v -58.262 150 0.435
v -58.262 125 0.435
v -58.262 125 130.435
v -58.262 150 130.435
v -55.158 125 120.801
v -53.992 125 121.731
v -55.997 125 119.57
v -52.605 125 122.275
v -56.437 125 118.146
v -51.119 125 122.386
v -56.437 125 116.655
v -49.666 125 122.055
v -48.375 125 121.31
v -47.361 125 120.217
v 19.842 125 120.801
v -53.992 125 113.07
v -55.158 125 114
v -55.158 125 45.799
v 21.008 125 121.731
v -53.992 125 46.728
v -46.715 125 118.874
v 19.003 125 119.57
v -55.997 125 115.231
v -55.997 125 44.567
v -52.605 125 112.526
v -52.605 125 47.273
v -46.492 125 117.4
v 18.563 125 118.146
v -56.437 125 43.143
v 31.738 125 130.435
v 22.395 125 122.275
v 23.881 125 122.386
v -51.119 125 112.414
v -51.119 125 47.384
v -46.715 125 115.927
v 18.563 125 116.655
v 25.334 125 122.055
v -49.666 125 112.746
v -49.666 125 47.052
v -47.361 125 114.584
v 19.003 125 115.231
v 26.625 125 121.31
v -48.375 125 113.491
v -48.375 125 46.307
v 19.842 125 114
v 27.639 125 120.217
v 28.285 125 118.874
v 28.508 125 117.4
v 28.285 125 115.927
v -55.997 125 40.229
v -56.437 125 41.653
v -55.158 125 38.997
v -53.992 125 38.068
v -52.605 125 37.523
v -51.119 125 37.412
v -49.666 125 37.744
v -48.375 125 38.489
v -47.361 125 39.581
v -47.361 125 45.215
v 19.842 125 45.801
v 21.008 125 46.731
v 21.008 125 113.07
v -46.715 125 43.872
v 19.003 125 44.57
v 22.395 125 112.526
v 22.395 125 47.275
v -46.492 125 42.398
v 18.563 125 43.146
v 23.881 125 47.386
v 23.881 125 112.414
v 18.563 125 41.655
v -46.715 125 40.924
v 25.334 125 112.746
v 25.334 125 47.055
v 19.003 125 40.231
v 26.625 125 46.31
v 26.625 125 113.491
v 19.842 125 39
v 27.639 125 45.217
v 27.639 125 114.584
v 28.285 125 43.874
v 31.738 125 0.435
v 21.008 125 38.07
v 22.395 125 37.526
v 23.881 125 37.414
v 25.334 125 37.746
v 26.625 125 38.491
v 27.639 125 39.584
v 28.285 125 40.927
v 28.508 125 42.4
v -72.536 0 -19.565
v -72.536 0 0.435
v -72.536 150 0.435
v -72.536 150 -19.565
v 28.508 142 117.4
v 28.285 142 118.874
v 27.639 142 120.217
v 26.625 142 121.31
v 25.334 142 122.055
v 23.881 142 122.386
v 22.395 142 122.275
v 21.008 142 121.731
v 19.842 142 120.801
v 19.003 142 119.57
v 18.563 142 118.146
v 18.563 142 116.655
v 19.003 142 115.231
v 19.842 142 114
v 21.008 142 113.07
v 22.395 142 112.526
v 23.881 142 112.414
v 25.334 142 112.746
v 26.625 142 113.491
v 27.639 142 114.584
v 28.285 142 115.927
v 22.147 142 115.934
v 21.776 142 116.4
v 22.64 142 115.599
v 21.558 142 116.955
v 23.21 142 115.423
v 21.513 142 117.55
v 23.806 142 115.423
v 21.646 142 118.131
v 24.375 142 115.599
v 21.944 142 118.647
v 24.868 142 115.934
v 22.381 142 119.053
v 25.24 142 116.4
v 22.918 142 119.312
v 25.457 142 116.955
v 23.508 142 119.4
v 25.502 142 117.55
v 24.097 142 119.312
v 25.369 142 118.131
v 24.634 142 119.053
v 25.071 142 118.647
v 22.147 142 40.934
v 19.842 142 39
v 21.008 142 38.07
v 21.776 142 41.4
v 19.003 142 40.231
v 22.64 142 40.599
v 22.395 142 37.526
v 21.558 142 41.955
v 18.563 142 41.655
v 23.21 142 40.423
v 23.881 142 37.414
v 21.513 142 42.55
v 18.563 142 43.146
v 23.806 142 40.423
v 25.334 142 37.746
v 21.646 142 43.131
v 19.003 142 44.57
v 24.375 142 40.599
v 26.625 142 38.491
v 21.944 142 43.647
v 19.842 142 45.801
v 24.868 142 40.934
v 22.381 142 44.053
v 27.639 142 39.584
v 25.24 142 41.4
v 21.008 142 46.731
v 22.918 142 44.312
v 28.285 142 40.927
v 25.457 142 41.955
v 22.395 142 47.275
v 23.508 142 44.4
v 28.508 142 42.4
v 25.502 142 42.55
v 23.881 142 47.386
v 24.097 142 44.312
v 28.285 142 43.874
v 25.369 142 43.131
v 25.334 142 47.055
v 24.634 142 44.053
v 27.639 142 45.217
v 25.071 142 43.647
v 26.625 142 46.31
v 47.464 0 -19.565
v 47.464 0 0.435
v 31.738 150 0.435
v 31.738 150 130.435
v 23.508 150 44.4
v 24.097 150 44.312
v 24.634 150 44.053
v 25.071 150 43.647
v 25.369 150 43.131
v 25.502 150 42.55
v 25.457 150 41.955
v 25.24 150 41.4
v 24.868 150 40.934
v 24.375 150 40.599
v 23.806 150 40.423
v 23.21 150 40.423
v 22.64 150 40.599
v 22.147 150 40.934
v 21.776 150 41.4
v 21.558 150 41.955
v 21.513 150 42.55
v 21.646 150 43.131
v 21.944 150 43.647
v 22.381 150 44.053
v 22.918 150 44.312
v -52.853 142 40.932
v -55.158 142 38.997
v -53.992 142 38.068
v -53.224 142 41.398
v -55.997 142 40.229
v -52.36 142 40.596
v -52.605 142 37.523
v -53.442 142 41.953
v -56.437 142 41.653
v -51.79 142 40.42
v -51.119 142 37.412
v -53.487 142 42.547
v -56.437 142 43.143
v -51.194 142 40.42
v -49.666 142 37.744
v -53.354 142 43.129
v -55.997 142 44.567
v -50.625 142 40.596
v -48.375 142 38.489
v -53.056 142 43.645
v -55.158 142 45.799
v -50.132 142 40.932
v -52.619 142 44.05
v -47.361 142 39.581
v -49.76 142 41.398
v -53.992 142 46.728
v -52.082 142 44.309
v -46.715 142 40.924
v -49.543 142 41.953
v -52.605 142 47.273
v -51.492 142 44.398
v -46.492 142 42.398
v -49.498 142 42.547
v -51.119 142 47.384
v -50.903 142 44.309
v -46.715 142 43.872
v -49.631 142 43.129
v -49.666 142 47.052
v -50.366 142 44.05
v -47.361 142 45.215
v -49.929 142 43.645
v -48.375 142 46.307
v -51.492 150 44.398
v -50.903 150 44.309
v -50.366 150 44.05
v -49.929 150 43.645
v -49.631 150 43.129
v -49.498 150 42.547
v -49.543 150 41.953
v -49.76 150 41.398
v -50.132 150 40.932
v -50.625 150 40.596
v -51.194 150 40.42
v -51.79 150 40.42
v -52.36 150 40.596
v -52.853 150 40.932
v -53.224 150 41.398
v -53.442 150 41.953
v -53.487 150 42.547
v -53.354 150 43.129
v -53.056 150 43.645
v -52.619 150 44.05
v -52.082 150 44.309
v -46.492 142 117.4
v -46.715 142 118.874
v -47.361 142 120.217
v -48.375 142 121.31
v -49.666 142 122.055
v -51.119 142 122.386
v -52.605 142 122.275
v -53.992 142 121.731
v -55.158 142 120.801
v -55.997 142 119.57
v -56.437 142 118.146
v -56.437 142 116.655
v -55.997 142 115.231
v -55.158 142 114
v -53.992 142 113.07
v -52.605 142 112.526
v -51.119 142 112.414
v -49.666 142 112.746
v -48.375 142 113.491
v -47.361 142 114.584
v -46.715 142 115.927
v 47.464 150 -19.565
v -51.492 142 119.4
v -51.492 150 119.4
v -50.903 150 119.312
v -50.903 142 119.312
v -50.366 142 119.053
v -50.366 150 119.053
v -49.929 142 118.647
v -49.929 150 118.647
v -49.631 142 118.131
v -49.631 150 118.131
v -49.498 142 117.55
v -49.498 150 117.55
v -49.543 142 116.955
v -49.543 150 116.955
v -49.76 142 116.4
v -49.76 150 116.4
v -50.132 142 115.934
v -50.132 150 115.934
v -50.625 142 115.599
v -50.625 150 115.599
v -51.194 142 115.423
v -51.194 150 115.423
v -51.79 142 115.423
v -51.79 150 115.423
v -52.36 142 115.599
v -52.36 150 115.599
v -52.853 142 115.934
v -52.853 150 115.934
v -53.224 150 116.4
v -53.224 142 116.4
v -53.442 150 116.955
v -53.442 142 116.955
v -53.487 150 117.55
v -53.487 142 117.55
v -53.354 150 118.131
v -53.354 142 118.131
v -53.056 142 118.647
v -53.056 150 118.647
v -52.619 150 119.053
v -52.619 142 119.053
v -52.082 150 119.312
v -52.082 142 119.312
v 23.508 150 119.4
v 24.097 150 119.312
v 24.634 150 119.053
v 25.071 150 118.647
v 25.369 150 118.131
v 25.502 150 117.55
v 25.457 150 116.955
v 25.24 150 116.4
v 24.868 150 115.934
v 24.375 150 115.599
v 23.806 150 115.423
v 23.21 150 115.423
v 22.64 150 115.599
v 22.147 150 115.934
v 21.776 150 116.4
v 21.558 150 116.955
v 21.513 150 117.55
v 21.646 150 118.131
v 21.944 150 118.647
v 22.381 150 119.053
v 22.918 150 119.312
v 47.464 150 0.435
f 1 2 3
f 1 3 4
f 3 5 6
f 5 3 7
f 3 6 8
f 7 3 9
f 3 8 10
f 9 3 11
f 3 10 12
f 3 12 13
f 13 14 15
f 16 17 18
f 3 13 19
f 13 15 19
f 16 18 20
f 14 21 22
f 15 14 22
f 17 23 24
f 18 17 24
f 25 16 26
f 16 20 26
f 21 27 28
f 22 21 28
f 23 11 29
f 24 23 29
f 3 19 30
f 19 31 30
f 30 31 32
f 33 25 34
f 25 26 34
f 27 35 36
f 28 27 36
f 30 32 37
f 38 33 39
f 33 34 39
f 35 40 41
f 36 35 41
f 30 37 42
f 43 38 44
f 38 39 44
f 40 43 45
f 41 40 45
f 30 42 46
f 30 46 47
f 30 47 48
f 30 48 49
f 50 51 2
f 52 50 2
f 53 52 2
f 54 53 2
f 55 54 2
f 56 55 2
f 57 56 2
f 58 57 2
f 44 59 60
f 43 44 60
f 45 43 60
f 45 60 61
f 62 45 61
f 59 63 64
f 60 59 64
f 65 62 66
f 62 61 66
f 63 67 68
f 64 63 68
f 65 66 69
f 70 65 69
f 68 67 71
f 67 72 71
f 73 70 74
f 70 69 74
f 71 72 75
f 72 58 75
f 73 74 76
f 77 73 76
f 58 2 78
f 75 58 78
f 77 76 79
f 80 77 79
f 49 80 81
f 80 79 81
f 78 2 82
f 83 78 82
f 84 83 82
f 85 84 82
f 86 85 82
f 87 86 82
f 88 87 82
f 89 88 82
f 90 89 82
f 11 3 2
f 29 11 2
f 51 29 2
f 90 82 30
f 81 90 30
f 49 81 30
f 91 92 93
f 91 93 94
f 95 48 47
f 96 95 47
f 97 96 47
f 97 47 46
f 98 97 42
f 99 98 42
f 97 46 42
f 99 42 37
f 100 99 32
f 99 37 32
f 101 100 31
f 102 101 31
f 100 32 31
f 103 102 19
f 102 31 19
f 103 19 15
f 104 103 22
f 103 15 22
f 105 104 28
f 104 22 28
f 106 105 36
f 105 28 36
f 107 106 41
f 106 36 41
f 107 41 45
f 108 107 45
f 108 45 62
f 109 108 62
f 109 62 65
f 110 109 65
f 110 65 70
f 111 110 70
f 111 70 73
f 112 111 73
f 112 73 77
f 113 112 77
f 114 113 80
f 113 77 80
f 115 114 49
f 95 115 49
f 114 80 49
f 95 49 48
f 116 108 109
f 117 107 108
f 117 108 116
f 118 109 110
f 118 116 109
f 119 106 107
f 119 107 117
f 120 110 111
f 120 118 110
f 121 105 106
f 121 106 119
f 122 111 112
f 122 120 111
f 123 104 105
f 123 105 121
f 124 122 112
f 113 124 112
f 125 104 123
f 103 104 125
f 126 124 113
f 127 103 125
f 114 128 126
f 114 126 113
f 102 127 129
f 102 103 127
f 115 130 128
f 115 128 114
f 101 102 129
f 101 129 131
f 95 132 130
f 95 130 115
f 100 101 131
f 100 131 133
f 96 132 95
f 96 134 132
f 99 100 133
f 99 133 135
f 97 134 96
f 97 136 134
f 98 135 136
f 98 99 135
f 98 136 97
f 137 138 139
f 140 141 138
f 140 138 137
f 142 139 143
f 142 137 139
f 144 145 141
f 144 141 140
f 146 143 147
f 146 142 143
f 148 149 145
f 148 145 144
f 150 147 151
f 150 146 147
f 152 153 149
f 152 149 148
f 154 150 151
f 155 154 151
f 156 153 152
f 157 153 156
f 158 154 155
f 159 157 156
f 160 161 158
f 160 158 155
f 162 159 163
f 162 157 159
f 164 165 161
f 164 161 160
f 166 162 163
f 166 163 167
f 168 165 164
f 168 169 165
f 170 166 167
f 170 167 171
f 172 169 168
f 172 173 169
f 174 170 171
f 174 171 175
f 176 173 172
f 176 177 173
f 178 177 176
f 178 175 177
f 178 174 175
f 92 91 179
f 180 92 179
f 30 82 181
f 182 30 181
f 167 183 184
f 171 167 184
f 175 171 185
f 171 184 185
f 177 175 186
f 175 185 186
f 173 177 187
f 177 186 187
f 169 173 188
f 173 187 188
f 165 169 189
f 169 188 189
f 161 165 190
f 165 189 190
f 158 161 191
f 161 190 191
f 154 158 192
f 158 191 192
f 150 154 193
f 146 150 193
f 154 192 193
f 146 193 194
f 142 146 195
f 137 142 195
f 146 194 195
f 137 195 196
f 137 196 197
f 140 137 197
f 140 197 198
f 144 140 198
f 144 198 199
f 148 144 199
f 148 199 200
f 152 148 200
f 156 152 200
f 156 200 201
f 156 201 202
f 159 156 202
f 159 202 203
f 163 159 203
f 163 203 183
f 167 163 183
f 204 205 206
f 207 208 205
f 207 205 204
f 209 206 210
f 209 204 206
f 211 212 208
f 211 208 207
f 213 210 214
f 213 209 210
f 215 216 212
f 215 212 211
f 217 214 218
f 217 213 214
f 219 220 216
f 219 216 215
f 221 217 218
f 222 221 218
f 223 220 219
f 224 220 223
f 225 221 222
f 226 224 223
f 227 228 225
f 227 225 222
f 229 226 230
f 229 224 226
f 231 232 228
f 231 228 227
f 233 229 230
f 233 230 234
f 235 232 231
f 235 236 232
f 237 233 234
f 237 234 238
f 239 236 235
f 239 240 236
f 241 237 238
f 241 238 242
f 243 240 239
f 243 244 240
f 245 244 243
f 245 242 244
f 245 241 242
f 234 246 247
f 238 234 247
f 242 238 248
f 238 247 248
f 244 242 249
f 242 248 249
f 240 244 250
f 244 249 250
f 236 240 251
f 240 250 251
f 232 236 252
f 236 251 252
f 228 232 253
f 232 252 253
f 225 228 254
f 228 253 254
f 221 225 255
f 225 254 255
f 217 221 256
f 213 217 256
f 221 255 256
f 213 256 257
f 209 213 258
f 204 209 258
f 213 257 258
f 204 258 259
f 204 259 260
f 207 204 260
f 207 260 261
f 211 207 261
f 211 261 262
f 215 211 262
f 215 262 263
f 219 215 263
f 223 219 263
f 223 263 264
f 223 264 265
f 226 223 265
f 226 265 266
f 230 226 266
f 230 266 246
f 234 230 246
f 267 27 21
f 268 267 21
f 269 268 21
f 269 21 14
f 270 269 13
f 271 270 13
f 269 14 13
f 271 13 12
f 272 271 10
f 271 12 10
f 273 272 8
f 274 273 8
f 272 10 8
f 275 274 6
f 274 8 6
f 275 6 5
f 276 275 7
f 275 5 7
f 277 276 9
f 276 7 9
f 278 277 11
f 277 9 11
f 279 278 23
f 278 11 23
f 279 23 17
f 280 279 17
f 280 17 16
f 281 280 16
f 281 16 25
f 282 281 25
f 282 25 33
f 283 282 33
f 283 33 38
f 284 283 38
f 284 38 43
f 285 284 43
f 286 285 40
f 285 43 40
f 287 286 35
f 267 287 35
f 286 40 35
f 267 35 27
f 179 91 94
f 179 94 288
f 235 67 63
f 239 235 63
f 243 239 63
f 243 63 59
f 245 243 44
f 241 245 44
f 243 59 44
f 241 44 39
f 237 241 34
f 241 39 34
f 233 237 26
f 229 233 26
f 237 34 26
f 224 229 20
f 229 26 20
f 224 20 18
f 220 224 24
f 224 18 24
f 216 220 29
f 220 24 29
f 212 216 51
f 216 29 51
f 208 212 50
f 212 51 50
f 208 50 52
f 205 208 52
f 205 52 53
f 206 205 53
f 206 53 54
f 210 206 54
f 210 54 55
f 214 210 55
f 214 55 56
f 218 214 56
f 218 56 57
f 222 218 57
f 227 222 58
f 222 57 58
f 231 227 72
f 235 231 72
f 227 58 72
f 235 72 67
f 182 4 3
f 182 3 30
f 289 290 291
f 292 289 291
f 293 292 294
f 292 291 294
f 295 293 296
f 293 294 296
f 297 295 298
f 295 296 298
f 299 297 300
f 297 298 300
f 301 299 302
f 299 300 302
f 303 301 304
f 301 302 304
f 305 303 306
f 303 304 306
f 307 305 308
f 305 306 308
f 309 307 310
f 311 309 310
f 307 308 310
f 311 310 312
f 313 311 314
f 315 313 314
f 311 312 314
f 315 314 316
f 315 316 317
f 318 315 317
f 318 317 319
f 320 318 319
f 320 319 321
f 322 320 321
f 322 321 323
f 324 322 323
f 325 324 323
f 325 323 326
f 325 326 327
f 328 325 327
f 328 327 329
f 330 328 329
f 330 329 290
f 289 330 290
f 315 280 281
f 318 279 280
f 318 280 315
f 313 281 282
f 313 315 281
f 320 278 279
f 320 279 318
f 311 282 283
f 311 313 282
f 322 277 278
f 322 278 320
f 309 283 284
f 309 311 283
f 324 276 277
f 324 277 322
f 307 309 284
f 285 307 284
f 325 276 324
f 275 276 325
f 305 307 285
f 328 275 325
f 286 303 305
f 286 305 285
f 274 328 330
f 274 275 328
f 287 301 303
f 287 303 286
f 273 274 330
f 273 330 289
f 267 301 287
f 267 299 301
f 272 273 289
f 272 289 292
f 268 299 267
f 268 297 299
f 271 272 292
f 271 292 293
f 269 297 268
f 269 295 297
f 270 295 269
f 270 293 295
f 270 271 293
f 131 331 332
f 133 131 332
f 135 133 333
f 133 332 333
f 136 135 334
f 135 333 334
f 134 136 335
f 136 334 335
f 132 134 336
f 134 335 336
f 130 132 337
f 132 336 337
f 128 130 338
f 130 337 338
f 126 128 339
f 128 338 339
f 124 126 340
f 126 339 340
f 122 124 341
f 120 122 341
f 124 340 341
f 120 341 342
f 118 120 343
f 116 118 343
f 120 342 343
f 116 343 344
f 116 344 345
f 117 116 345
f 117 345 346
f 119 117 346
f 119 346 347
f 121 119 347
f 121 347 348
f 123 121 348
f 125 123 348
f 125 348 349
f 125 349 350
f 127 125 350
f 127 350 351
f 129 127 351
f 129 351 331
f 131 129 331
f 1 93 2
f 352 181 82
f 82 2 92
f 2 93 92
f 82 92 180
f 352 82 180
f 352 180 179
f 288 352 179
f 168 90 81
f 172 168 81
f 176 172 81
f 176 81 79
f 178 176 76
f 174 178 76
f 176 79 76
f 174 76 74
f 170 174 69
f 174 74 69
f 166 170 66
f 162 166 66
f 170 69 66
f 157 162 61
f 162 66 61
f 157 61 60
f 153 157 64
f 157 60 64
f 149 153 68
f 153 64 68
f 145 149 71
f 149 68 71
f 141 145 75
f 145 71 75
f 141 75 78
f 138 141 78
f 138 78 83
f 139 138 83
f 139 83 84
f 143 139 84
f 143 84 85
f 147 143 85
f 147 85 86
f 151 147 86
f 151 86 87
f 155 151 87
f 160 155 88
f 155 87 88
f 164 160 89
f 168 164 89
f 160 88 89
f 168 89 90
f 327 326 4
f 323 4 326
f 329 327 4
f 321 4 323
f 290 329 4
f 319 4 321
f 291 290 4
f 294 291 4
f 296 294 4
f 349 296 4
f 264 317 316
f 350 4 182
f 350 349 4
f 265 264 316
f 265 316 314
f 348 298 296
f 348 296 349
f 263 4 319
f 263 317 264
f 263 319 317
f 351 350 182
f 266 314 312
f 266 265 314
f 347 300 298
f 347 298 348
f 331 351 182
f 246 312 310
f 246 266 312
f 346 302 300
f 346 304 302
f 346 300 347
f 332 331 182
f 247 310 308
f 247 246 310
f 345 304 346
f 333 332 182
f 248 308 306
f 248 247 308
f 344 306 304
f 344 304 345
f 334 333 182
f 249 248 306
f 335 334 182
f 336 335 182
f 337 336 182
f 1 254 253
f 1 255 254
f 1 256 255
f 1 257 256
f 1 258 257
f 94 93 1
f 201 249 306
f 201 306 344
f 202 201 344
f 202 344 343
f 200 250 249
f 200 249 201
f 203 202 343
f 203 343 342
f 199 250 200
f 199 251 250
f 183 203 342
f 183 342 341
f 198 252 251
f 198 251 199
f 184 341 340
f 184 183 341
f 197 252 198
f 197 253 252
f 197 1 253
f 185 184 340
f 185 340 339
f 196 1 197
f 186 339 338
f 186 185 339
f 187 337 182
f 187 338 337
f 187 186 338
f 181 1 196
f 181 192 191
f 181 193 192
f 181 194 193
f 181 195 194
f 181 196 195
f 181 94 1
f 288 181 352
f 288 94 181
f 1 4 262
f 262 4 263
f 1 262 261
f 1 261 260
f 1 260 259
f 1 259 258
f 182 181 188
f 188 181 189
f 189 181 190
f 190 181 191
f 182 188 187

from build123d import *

# Parameters (mm, degrees)
SKETCH_1_W          = 120
SKETCH_1_H          = 20
EXTRUDE_1_DEPTH     = 150
SKETCH_2_W          = 90
SKETCH_2_H          = 25
EXTRUDE_2_DEPTH     = 130
SKETCH_3_R          = 2
CUT_EXTRUDE_1_DEPTH = 130
SKETCH_5_R          = 5
CUT_EXTRUDE_2_DEPTH = 17


with BuildPart() as part:
    # 草图1 → 凸台-拉伸1 (new body)
    with BuildSketch(Plane(origin=(0, 0, 0), x_dir=(1, 0, 0), z_dir=(0, 1, 0))):
        with Locations((-12.536231884, 9.565217391)):
            Rectangle(SKETCH_1_W, SKETCH_1_H)
    extrude(amount=EXTRUDE_1_DEPTH)

    # 草图2 → 凸台-拉伸2 (add)
    with BuildSketch(Plane.XY.offset(0.434782609)):
        with Locations((-13.26152797, 137.5)):
            Rectangle(SKETCH_2_W, SKETCH_2_H)
    extrude(amount=EXTRUDE_2_DEPTH)

    # 草图3 → 切除-拉伸1 (cut)
    with BuildSketch(Plane(origin=(0, 150, 0), x_dir=(1, 0, 0), z_dir=(0, 1, 0))):
        with Locations(Location((-51.492397045, -42.39796667, 0), (0, 0, 270))):
            Circle(SKETCH_3_R)
        with Locations(Location((23.507602913, -42.400462624, 0), (0, 0, 270))):
            Circle(SKETCH_3_R)
        with Locations(Location((-51.492397045, -117.400462624, 0), (0, 0, 270))):
            Circle(SKETCH_3_R)
        with Locations(Location((23.507602955, -117.400462624, 0), (0, 0, 270))):
            Circle(SKETCH_3_R)
    extrude(amount=-CUT_EXTRUDE_1_DEPTH, mode=Mode.SUBTRACT)

    # 草图5 → 切除-拉伸2 (cut)
    with BuildSketch(Plane.XZ.offset(-125)):
        with Locations((-51.492397045, 117.400462624)):
            Circle(SKETCH_5_R)
        with Locations((23.507602955, 117.400462624)):
            Circle(SKETCH_5_R)
        with Locations((23.507602913, 42.400462624)):
            Circle(SKETCH_5_R)
        with Locations((-51.492397045, 42.39796667)):
            Circle(SKETCH_5_R)
    extrude(amount=-CUT_EXTRUDE_2_DEPTH, mode=Mode.SUBTRACT)


solid = part.part
